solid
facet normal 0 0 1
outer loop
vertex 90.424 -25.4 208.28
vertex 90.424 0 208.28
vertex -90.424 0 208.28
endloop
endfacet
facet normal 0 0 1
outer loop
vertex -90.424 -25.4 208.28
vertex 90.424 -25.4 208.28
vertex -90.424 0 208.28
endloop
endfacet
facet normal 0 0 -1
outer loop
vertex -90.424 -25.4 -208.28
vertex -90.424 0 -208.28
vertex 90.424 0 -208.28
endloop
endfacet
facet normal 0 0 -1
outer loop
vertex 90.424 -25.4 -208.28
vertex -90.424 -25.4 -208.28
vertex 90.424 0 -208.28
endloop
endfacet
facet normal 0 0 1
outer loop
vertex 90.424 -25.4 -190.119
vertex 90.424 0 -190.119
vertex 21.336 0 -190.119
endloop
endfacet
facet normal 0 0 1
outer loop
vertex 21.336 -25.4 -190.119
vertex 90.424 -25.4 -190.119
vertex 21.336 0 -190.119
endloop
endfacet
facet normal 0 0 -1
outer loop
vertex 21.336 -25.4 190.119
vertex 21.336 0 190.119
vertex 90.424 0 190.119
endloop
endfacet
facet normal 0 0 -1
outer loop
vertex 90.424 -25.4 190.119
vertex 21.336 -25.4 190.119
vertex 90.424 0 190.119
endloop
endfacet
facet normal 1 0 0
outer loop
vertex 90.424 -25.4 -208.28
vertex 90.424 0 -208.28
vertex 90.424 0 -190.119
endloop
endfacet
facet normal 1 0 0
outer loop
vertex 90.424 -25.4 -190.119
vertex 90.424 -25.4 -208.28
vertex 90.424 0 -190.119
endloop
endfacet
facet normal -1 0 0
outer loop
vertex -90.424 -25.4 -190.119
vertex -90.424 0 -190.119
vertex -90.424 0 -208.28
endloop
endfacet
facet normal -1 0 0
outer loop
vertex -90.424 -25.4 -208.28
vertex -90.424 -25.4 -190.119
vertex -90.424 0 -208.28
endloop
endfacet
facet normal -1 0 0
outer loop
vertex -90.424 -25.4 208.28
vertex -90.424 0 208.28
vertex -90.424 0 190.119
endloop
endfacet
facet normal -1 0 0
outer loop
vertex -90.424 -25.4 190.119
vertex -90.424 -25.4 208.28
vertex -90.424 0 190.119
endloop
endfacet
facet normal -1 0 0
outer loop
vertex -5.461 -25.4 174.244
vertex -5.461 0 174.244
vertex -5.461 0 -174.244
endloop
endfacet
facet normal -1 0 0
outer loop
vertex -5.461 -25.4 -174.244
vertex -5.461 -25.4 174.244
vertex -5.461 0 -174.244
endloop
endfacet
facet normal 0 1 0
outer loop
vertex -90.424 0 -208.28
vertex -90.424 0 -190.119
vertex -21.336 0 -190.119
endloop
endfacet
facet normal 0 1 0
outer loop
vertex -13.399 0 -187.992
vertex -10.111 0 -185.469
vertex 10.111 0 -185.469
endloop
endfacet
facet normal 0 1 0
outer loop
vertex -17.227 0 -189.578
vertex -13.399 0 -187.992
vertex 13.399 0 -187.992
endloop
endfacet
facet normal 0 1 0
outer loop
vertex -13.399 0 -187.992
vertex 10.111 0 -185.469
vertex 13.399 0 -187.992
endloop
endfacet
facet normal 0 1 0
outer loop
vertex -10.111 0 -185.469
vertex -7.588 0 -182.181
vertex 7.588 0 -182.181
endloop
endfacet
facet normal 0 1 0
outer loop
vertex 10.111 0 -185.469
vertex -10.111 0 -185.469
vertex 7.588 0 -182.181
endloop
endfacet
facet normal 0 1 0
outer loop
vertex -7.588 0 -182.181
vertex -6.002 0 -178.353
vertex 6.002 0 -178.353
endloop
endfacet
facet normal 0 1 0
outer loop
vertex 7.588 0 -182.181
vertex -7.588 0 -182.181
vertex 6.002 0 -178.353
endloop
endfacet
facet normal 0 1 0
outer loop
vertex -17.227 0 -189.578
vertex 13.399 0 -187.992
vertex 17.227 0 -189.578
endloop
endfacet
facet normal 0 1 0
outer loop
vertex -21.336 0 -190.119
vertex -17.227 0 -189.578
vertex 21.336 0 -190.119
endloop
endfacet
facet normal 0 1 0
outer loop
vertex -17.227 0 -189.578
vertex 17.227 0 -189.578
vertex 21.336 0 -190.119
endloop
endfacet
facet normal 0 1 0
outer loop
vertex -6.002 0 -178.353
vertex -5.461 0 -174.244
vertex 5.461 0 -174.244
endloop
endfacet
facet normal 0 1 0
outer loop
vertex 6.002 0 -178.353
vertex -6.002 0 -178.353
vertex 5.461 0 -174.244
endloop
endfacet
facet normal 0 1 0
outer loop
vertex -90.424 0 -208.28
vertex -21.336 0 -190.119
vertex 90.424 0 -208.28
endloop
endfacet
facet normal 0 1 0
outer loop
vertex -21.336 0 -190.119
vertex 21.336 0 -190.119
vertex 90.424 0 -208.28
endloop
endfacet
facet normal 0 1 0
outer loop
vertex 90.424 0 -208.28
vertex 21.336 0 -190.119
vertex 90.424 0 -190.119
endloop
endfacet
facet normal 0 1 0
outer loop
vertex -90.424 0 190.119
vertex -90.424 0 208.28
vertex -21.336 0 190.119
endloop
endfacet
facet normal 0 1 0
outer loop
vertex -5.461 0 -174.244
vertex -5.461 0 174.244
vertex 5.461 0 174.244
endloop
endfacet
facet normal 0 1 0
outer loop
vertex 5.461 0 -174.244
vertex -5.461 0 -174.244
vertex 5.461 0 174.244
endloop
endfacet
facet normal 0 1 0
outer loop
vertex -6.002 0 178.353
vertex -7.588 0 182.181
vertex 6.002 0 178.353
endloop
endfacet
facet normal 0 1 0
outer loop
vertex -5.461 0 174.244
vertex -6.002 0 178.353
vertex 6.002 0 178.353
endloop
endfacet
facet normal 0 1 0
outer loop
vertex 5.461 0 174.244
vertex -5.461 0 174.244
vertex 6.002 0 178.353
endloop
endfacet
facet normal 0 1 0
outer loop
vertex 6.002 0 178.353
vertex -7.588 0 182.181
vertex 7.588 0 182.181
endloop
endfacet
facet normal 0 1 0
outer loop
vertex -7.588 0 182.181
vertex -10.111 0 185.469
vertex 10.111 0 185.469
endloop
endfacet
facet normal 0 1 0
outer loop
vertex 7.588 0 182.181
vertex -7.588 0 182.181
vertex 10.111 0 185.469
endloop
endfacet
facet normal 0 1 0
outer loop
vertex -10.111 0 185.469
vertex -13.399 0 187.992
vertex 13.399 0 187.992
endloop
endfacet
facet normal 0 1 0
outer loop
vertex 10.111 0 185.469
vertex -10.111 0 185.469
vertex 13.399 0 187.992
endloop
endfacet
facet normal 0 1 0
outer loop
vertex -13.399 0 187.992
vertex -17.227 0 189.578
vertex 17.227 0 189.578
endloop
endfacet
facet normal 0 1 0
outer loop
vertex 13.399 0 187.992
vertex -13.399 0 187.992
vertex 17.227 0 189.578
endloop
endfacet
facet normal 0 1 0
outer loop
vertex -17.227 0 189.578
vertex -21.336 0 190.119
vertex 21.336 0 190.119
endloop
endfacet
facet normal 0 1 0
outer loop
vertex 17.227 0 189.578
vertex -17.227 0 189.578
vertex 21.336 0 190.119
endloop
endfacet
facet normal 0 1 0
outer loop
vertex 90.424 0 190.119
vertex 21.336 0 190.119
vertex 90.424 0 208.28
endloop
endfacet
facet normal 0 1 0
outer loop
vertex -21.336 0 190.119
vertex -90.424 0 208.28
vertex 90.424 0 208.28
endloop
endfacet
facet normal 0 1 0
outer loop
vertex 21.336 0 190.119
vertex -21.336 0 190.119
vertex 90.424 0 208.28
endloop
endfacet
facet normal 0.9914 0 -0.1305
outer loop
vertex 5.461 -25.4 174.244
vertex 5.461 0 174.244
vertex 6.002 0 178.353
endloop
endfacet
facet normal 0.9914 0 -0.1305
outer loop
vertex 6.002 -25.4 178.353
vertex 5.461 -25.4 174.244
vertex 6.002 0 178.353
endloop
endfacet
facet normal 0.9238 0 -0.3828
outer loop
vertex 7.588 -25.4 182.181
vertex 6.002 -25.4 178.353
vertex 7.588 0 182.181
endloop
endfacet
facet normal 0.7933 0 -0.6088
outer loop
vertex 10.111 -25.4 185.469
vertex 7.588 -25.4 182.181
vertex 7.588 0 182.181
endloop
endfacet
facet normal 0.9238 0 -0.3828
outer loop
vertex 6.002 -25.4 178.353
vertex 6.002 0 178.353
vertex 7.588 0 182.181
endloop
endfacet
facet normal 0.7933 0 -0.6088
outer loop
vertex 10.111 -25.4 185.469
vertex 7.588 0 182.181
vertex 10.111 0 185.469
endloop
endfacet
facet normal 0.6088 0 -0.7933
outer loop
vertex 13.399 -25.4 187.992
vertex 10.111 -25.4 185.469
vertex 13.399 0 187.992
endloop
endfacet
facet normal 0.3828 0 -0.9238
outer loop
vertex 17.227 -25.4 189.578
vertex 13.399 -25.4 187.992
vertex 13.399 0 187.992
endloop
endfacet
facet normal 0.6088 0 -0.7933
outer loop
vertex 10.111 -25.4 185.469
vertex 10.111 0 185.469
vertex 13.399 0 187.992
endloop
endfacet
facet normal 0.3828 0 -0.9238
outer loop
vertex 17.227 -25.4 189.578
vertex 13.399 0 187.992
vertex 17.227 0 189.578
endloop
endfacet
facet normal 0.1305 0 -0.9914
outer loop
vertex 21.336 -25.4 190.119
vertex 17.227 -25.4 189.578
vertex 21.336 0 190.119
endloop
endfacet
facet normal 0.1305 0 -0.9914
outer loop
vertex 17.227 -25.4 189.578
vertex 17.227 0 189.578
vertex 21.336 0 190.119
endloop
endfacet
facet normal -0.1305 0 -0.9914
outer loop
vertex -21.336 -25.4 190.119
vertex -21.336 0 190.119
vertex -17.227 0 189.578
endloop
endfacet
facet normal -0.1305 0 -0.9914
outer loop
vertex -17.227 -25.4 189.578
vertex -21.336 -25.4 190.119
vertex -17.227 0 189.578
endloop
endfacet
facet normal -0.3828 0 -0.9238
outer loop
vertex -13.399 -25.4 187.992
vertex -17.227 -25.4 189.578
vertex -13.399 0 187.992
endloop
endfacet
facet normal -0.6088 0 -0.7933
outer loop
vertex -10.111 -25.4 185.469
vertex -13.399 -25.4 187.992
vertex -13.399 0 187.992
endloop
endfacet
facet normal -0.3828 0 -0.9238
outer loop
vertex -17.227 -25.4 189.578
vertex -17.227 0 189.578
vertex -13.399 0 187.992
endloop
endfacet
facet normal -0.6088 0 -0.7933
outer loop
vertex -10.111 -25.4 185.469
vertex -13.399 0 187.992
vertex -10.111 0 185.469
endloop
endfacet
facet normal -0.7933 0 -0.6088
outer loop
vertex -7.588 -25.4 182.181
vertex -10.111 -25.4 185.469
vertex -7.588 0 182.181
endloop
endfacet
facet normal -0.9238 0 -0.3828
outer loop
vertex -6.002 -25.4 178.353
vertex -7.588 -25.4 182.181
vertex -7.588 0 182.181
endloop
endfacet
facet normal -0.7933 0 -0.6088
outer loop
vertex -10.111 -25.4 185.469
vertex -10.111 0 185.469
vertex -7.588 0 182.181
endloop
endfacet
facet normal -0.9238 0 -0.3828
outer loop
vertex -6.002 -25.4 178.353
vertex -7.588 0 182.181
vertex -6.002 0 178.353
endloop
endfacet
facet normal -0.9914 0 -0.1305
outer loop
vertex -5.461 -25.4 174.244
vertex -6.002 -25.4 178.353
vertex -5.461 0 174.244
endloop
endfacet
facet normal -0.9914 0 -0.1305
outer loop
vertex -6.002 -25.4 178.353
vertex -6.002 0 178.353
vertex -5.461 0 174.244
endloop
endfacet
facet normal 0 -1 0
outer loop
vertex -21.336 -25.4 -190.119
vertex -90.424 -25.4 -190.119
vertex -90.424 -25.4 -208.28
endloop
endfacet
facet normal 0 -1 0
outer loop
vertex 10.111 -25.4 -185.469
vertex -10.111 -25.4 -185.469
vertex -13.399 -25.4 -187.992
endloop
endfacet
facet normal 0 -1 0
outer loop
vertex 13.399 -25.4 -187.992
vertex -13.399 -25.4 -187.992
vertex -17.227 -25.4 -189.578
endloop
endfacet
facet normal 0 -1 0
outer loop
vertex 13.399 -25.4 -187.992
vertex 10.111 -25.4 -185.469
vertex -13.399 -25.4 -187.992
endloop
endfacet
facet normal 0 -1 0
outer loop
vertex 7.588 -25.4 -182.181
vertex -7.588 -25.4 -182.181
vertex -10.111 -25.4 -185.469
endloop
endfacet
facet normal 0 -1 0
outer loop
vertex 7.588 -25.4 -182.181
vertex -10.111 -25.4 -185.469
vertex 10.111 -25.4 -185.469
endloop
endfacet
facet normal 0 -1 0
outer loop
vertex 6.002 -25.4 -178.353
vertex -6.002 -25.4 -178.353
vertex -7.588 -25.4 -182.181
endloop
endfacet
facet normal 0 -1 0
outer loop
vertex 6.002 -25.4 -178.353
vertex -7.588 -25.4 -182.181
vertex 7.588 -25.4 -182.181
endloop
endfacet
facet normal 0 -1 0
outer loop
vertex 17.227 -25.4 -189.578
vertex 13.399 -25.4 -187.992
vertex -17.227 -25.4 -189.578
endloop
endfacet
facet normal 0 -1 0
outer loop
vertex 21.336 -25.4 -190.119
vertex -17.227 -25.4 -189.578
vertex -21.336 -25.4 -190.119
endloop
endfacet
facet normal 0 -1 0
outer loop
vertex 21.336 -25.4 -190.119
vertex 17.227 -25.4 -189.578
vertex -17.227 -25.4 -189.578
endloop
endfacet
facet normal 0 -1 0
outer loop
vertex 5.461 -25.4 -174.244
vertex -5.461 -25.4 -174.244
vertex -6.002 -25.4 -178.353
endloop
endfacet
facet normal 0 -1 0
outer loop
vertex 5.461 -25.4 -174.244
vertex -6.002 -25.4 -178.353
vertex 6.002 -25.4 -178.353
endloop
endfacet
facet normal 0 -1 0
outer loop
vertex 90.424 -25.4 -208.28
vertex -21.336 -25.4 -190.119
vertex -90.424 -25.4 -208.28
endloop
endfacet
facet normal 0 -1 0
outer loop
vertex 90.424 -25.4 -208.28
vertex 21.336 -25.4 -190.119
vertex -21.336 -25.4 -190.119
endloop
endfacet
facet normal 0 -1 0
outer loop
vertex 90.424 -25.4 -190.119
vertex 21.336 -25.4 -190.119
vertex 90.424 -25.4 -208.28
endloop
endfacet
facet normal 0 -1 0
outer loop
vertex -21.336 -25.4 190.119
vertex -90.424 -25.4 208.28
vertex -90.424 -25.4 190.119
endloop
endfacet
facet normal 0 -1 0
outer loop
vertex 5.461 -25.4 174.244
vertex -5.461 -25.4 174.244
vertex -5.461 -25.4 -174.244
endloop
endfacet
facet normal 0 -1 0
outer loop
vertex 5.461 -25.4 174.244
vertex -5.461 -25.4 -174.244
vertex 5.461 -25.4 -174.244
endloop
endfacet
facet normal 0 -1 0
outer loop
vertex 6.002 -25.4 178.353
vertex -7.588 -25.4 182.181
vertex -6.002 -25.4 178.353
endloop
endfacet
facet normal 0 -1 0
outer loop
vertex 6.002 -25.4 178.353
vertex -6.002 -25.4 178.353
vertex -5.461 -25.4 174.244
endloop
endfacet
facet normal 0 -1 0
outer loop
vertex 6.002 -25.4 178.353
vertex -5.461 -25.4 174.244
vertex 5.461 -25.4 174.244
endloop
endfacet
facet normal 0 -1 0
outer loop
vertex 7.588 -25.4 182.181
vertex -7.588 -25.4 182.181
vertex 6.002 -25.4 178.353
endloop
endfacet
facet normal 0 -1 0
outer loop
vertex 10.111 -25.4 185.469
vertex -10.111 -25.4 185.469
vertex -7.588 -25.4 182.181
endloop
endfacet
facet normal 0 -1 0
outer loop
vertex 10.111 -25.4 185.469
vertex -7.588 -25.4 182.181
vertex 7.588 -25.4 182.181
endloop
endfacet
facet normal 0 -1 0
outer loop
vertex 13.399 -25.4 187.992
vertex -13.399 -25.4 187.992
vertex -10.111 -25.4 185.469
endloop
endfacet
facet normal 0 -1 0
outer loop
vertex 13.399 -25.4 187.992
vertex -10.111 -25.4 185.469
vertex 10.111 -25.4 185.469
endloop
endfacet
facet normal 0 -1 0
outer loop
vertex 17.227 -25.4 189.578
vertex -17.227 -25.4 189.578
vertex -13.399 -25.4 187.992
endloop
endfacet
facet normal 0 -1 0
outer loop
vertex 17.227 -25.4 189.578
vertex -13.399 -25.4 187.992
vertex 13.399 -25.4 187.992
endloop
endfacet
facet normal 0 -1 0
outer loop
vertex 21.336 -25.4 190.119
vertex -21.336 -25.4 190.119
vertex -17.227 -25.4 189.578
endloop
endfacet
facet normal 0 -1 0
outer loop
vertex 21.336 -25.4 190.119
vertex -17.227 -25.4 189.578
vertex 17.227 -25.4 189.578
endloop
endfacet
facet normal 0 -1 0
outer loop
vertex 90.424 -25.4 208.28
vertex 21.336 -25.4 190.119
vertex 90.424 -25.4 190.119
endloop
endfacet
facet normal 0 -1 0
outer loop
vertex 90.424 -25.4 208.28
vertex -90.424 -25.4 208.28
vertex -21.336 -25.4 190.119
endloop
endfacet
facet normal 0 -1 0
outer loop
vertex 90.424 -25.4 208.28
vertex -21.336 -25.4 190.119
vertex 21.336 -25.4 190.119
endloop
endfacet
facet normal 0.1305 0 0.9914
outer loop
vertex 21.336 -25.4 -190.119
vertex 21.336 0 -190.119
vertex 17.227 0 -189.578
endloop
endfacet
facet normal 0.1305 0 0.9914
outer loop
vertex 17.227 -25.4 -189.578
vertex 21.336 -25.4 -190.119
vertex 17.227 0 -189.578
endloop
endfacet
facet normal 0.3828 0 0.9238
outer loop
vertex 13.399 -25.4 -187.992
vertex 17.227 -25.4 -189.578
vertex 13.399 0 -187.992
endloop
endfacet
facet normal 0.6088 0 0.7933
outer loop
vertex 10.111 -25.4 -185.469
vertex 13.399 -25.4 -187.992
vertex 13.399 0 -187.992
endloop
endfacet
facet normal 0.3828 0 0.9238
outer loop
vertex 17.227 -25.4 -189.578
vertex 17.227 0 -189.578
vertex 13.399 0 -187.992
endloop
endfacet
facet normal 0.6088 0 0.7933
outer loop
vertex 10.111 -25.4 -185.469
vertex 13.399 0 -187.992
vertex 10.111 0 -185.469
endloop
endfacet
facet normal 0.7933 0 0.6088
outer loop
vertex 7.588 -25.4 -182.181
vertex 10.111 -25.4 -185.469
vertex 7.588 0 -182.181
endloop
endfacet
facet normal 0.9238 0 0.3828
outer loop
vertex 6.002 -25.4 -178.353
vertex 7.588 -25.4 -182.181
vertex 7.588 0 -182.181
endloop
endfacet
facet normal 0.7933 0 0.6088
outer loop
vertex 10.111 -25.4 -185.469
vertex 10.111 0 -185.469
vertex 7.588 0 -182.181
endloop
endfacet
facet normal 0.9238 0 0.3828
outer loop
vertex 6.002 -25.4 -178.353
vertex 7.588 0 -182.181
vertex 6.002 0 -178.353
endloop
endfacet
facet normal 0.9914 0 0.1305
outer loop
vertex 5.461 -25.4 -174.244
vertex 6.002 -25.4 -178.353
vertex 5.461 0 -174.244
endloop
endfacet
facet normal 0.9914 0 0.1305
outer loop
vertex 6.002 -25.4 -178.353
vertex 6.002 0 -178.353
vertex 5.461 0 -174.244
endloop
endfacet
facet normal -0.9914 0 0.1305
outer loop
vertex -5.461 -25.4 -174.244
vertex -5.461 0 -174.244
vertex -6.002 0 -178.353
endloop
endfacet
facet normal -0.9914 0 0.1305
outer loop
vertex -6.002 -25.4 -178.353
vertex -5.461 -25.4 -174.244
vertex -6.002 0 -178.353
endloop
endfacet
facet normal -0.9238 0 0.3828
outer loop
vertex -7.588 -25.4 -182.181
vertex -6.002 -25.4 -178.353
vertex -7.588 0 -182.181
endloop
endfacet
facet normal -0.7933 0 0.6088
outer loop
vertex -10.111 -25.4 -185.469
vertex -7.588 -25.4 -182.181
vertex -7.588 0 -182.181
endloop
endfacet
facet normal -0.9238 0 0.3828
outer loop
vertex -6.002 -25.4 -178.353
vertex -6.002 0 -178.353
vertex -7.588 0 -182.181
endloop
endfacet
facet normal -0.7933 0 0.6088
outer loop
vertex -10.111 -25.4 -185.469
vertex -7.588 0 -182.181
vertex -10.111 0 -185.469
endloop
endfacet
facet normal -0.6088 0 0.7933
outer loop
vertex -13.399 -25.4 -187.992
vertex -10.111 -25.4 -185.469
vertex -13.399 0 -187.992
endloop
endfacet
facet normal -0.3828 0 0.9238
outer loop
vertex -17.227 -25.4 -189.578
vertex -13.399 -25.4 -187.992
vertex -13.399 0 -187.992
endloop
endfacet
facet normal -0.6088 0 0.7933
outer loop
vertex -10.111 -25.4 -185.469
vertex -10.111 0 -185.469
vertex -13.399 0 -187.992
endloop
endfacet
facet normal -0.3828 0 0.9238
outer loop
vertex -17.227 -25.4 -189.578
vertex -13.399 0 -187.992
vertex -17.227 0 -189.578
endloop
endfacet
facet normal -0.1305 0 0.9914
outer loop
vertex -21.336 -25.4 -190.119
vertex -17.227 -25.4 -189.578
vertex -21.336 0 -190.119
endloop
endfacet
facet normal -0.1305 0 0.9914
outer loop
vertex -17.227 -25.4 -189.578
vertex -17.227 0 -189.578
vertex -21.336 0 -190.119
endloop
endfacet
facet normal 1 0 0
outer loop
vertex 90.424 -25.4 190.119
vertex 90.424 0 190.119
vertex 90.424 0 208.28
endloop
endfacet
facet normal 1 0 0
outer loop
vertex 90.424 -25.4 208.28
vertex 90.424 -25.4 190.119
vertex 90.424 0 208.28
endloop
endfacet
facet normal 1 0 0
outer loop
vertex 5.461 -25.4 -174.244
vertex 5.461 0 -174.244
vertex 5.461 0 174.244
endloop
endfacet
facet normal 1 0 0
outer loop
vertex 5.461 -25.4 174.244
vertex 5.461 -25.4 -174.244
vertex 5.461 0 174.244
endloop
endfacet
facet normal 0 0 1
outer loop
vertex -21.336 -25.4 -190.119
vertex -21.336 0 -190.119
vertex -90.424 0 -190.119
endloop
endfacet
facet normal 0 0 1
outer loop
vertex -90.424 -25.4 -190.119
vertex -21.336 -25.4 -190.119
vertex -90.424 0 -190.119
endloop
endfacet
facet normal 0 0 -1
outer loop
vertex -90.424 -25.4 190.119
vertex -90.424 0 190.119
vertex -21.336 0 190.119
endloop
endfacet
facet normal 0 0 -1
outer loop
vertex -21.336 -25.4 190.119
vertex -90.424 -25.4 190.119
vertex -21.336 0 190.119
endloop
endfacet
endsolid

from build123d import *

# Parameters (mm, degrees)
F1_DEPTH = 25.4


with BuildPart() as f1:
    # F0 (on Front) → F1 (new body)
    with BuildSketch(Plane.XZ):
        with BuildLine():
            Line((90.424, 208.28), (-90.424, 208.28))
            Line((-90.424, 208.28), (-90.424, 190.119))
            Line((-90.424, 190.119), (-21.336, 190.119))
            ThreePointArc((-21.336, 190.119), (-10.11068, 185.46932), (-5.461, 174.244))
            Line((-5.461, 174.244), (-5.461, -174.244))
            ThreePointArc((-5.461, -174.244), (-10.11068, -185.46932), (-21.336, -190.119))
            Line((-21.336, -190.119), (-90.424, -190.119))
            Line((-90.424, -190.119), (-90.424, -208.28))
            Line((-90.424, -208.28), (90.424, -208.28))
            Line((90.424, -208.28), (90.424, -190.119))
            Line((90.424, -190.119), (21.336, -190.119))
            ThreePointArc((21.336, -190.119), (10.11068, -185.46932), (5.461, -174.244))
            Line((5.461, -174.244), (5.461, 174.244))
            ThreePointArc((5.461, 174.244), (10.11068, 185.46932), (21.336, 190.119))
            Line((21.336, 190.119), (90.424, 190.119))
            Line((90.424, 190.119), (90.424, 208.28))
        make_face()
    extrude(amount=F1_DEPTH)


solid = f1.part
